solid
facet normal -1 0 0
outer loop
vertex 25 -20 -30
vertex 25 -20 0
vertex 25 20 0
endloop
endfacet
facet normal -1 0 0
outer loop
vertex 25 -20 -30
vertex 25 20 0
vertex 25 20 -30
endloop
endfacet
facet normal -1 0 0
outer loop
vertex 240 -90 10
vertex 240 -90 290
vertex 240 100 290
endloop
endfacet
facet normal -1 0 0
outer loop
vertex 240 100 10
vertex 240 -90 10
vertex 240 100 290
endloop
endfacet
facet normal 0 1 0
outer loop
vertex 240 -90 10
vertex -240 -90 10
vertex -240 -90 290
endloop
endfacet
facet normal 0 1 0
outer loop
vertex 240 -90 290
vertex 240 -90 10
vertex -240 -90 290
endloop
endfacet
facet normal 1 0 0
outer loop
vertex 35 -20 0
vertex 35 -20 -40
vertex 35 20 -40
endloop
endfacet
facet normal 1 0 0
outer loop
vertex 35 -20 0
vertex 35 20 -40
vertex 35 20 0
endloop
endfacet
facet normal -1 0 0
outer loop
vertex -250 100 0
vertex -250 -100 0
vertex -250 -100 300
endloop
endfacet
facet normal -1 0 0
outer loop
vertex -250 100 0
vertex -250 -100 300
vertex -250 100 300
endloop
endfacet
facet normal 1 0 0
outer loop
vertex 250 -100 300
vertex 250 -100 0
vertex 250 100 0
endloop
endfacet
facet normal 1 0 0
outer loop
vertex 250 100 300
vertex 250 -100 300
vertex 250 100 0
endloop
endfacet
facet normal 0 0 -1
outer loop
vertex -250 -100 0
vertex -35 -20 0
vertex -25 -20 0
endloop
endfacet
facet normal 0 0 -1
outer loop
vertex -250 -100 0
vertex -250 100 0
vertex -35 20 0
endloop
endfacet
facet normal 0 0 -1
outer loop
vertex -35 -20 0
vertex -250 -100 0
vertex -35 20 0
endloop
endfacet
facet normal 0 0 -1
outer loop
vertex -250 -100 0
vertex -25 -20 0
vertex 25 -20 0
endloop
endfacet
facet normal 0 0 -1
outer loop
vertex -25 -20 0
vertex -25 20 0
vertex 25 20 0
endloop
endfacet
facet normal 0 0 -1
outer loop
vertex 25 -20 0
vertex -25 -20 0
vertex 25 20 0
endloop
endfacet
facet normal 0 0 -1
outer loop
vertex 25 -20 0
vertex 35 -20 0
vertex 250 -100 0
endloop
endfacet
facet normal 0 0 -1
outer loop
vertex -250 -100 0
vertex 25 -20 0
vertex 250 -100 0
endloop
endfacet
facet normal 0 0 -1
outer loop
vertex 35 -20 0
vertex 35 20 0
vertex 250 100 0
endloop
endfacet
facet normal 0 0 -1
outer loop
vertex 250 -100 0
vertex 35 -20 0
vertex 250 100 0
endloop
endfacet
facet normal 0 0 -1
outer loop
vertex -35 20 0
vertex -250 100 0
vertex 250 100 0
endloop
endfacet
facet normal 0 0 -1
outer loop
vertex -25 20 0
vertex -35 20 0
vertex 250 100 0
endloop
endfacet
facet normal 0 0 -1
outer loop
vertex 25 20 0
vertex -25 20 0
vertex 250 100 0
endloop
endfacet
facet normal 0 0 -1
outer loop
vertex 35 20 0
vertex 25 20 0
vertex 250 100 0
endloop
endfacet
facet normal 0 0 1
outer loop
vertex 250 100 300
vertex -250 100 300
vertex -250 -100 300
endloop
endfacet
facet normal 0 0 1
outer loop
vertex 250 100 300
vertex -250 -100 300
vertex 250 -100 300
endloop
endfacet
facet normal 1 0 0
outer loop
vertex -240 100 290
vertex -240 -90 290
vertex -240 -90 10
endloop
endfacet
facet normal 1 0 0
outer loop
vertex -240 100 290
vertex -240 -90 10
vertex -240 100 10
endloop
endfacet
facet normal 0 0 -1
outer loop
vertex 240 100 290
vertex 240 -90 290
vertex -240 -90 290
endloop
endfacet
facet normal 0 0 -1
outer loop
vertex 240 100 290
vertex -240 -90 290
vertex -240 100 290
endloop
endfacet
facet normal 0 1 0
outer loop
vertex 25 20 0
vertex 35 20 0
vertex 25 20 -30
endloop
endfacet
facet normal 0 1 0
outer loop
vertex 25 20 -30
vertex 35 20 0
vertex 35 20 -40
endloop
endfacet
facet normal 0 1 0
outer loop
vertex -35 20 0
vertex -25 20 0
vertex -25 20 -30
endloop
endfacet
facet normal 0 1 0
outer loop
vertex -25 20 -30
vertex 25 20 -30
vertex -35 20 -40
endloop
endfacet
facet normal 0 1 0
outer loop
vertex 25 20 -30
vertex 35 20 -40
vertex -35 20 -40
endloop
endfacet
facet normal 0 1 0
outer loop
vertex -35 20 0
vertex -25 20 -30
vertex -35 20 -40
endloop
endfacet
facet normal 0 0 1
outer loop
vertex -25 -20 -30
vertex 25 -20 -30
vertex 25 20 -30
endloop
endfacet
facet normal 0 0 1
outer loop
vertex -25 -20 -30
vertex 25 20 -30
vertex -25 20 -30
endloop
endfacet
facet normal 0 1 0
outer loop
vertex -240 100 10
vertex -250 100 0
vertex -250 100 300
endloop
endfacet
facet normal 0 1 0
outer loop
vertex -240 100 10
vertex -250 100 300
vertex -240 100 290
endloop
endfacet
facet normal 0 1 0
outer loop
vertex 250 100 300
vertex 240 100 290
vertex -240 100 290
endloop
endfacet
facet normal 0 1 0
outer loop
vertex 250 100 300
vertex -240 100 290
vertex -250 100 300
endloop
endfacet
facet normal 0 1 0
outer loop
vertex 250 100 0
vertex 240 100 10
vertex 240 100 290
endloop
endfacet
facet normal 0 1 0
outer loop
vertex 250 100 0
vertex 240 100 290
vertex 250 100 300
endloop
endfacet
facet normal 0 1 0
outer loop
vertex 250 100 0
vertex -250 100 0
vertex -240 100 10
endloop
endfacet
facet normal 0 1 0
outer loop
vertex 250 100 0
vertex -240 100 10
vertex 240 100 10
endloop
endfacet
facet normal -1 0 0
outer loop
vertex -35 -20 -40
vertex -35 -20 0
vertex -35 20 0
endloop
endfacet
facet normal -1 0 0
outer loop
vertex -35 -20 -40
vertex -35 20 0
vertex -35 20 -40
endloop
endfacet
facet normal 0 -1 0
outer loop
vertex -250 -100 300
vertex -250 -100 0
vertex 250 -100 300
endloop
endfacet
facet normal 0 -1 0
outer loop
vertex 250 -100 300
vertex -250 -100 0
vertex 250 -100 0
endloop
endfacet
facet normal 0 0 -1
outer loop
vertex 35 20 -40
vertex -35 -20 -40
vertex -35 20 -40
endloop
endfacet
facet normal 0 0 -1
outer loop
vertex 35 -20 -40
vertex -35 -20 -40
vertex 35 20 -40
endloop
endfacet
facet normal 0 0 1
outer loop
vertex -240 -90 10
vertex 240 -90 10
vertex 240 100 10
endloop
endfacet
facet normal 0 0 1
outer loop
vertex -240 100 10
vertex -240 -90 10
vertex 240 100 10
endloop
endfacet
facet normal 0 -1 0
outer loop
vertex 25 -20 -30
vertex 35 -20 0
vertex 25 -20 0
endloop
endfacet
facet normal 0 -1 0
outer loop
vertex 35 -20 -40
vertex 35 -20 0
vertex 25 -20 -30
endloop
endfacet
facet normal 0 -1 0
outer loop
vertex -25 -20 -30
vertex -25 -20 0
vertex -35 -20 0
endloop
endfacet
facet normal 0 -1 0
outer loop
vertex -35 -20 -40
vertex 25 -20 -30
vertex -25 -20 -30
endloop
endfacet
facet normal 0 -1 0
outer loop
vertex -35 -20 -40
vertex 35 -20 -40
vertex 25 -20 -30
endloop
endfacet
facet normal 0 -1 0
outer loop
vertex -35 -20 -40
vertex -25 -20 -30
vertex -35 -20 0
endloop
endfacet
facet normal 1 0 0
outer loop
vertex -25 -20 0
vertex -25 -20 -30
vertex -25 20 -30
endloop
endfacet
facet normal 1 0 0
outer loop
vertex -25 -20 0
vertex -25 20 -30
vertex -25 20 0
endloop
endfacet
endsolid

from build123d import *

# Parameters (mm, degrees)
SKETCH1_W                = 500
SKETCH1_H                = 200
BOSS_EXTRUDE1_DEPTH      = 300
BOSS_EXTRUDE2_DEPTH      = 20
BOSS_EXTRUDE2_DEPTH_BACK = 20
SHELL1_START             = -240
SHELL1_OUTLINE_W         = 190
SHELL1_OUTLINE_H         = 280
SHELL1_DEPTH             = 480


# Read off the part's stored shape, not the designer's step: Shell1
with BuildPart() as part:
    # Sketch1 → Boss-Extrude1 (new body)
    with BuildSketch(Plane.XY):
        Rectangle(SKETCH1_W, SKETCH1_H)
    extrude(amount=BOSS_EXTRUDE1_DEPTH)

    # Sketch2 → Boss-Extrude2 (add, two sides: drawn at the far end of the back side and taken through both)
    with BuildSketch(Plane(origin=(0, 0, 0), x_dir=(1, 0, 0), z_dir=(0, 1, 0)).offset(-BOSS_EXTRUDE2_DEPTH_BACK)):
        Polygon((25, 0), (25, 30), (-25, 30), (-25, 0), (-35, 0), (-35, 40), (35, 40), (35, 0), align=None)
    extrude(amount=BOSS_EXTRUDE2_DEPTH + BOSS_EXTRUDE2_DEPTH_BACK)

    # Shell1 outline → Shell1 (cut)
    with BuildSketch(Plane.YZ.offset(SHELL1_START)):
        with Locations((5, 150)):
            Rectangle(SHELL1_OUTLINE_W, SHELL1_OUTLINE_H)
    extrude(amount=SHELL1_DEPTH, mode=Mode.SUBTRACT)


solid = part.part
